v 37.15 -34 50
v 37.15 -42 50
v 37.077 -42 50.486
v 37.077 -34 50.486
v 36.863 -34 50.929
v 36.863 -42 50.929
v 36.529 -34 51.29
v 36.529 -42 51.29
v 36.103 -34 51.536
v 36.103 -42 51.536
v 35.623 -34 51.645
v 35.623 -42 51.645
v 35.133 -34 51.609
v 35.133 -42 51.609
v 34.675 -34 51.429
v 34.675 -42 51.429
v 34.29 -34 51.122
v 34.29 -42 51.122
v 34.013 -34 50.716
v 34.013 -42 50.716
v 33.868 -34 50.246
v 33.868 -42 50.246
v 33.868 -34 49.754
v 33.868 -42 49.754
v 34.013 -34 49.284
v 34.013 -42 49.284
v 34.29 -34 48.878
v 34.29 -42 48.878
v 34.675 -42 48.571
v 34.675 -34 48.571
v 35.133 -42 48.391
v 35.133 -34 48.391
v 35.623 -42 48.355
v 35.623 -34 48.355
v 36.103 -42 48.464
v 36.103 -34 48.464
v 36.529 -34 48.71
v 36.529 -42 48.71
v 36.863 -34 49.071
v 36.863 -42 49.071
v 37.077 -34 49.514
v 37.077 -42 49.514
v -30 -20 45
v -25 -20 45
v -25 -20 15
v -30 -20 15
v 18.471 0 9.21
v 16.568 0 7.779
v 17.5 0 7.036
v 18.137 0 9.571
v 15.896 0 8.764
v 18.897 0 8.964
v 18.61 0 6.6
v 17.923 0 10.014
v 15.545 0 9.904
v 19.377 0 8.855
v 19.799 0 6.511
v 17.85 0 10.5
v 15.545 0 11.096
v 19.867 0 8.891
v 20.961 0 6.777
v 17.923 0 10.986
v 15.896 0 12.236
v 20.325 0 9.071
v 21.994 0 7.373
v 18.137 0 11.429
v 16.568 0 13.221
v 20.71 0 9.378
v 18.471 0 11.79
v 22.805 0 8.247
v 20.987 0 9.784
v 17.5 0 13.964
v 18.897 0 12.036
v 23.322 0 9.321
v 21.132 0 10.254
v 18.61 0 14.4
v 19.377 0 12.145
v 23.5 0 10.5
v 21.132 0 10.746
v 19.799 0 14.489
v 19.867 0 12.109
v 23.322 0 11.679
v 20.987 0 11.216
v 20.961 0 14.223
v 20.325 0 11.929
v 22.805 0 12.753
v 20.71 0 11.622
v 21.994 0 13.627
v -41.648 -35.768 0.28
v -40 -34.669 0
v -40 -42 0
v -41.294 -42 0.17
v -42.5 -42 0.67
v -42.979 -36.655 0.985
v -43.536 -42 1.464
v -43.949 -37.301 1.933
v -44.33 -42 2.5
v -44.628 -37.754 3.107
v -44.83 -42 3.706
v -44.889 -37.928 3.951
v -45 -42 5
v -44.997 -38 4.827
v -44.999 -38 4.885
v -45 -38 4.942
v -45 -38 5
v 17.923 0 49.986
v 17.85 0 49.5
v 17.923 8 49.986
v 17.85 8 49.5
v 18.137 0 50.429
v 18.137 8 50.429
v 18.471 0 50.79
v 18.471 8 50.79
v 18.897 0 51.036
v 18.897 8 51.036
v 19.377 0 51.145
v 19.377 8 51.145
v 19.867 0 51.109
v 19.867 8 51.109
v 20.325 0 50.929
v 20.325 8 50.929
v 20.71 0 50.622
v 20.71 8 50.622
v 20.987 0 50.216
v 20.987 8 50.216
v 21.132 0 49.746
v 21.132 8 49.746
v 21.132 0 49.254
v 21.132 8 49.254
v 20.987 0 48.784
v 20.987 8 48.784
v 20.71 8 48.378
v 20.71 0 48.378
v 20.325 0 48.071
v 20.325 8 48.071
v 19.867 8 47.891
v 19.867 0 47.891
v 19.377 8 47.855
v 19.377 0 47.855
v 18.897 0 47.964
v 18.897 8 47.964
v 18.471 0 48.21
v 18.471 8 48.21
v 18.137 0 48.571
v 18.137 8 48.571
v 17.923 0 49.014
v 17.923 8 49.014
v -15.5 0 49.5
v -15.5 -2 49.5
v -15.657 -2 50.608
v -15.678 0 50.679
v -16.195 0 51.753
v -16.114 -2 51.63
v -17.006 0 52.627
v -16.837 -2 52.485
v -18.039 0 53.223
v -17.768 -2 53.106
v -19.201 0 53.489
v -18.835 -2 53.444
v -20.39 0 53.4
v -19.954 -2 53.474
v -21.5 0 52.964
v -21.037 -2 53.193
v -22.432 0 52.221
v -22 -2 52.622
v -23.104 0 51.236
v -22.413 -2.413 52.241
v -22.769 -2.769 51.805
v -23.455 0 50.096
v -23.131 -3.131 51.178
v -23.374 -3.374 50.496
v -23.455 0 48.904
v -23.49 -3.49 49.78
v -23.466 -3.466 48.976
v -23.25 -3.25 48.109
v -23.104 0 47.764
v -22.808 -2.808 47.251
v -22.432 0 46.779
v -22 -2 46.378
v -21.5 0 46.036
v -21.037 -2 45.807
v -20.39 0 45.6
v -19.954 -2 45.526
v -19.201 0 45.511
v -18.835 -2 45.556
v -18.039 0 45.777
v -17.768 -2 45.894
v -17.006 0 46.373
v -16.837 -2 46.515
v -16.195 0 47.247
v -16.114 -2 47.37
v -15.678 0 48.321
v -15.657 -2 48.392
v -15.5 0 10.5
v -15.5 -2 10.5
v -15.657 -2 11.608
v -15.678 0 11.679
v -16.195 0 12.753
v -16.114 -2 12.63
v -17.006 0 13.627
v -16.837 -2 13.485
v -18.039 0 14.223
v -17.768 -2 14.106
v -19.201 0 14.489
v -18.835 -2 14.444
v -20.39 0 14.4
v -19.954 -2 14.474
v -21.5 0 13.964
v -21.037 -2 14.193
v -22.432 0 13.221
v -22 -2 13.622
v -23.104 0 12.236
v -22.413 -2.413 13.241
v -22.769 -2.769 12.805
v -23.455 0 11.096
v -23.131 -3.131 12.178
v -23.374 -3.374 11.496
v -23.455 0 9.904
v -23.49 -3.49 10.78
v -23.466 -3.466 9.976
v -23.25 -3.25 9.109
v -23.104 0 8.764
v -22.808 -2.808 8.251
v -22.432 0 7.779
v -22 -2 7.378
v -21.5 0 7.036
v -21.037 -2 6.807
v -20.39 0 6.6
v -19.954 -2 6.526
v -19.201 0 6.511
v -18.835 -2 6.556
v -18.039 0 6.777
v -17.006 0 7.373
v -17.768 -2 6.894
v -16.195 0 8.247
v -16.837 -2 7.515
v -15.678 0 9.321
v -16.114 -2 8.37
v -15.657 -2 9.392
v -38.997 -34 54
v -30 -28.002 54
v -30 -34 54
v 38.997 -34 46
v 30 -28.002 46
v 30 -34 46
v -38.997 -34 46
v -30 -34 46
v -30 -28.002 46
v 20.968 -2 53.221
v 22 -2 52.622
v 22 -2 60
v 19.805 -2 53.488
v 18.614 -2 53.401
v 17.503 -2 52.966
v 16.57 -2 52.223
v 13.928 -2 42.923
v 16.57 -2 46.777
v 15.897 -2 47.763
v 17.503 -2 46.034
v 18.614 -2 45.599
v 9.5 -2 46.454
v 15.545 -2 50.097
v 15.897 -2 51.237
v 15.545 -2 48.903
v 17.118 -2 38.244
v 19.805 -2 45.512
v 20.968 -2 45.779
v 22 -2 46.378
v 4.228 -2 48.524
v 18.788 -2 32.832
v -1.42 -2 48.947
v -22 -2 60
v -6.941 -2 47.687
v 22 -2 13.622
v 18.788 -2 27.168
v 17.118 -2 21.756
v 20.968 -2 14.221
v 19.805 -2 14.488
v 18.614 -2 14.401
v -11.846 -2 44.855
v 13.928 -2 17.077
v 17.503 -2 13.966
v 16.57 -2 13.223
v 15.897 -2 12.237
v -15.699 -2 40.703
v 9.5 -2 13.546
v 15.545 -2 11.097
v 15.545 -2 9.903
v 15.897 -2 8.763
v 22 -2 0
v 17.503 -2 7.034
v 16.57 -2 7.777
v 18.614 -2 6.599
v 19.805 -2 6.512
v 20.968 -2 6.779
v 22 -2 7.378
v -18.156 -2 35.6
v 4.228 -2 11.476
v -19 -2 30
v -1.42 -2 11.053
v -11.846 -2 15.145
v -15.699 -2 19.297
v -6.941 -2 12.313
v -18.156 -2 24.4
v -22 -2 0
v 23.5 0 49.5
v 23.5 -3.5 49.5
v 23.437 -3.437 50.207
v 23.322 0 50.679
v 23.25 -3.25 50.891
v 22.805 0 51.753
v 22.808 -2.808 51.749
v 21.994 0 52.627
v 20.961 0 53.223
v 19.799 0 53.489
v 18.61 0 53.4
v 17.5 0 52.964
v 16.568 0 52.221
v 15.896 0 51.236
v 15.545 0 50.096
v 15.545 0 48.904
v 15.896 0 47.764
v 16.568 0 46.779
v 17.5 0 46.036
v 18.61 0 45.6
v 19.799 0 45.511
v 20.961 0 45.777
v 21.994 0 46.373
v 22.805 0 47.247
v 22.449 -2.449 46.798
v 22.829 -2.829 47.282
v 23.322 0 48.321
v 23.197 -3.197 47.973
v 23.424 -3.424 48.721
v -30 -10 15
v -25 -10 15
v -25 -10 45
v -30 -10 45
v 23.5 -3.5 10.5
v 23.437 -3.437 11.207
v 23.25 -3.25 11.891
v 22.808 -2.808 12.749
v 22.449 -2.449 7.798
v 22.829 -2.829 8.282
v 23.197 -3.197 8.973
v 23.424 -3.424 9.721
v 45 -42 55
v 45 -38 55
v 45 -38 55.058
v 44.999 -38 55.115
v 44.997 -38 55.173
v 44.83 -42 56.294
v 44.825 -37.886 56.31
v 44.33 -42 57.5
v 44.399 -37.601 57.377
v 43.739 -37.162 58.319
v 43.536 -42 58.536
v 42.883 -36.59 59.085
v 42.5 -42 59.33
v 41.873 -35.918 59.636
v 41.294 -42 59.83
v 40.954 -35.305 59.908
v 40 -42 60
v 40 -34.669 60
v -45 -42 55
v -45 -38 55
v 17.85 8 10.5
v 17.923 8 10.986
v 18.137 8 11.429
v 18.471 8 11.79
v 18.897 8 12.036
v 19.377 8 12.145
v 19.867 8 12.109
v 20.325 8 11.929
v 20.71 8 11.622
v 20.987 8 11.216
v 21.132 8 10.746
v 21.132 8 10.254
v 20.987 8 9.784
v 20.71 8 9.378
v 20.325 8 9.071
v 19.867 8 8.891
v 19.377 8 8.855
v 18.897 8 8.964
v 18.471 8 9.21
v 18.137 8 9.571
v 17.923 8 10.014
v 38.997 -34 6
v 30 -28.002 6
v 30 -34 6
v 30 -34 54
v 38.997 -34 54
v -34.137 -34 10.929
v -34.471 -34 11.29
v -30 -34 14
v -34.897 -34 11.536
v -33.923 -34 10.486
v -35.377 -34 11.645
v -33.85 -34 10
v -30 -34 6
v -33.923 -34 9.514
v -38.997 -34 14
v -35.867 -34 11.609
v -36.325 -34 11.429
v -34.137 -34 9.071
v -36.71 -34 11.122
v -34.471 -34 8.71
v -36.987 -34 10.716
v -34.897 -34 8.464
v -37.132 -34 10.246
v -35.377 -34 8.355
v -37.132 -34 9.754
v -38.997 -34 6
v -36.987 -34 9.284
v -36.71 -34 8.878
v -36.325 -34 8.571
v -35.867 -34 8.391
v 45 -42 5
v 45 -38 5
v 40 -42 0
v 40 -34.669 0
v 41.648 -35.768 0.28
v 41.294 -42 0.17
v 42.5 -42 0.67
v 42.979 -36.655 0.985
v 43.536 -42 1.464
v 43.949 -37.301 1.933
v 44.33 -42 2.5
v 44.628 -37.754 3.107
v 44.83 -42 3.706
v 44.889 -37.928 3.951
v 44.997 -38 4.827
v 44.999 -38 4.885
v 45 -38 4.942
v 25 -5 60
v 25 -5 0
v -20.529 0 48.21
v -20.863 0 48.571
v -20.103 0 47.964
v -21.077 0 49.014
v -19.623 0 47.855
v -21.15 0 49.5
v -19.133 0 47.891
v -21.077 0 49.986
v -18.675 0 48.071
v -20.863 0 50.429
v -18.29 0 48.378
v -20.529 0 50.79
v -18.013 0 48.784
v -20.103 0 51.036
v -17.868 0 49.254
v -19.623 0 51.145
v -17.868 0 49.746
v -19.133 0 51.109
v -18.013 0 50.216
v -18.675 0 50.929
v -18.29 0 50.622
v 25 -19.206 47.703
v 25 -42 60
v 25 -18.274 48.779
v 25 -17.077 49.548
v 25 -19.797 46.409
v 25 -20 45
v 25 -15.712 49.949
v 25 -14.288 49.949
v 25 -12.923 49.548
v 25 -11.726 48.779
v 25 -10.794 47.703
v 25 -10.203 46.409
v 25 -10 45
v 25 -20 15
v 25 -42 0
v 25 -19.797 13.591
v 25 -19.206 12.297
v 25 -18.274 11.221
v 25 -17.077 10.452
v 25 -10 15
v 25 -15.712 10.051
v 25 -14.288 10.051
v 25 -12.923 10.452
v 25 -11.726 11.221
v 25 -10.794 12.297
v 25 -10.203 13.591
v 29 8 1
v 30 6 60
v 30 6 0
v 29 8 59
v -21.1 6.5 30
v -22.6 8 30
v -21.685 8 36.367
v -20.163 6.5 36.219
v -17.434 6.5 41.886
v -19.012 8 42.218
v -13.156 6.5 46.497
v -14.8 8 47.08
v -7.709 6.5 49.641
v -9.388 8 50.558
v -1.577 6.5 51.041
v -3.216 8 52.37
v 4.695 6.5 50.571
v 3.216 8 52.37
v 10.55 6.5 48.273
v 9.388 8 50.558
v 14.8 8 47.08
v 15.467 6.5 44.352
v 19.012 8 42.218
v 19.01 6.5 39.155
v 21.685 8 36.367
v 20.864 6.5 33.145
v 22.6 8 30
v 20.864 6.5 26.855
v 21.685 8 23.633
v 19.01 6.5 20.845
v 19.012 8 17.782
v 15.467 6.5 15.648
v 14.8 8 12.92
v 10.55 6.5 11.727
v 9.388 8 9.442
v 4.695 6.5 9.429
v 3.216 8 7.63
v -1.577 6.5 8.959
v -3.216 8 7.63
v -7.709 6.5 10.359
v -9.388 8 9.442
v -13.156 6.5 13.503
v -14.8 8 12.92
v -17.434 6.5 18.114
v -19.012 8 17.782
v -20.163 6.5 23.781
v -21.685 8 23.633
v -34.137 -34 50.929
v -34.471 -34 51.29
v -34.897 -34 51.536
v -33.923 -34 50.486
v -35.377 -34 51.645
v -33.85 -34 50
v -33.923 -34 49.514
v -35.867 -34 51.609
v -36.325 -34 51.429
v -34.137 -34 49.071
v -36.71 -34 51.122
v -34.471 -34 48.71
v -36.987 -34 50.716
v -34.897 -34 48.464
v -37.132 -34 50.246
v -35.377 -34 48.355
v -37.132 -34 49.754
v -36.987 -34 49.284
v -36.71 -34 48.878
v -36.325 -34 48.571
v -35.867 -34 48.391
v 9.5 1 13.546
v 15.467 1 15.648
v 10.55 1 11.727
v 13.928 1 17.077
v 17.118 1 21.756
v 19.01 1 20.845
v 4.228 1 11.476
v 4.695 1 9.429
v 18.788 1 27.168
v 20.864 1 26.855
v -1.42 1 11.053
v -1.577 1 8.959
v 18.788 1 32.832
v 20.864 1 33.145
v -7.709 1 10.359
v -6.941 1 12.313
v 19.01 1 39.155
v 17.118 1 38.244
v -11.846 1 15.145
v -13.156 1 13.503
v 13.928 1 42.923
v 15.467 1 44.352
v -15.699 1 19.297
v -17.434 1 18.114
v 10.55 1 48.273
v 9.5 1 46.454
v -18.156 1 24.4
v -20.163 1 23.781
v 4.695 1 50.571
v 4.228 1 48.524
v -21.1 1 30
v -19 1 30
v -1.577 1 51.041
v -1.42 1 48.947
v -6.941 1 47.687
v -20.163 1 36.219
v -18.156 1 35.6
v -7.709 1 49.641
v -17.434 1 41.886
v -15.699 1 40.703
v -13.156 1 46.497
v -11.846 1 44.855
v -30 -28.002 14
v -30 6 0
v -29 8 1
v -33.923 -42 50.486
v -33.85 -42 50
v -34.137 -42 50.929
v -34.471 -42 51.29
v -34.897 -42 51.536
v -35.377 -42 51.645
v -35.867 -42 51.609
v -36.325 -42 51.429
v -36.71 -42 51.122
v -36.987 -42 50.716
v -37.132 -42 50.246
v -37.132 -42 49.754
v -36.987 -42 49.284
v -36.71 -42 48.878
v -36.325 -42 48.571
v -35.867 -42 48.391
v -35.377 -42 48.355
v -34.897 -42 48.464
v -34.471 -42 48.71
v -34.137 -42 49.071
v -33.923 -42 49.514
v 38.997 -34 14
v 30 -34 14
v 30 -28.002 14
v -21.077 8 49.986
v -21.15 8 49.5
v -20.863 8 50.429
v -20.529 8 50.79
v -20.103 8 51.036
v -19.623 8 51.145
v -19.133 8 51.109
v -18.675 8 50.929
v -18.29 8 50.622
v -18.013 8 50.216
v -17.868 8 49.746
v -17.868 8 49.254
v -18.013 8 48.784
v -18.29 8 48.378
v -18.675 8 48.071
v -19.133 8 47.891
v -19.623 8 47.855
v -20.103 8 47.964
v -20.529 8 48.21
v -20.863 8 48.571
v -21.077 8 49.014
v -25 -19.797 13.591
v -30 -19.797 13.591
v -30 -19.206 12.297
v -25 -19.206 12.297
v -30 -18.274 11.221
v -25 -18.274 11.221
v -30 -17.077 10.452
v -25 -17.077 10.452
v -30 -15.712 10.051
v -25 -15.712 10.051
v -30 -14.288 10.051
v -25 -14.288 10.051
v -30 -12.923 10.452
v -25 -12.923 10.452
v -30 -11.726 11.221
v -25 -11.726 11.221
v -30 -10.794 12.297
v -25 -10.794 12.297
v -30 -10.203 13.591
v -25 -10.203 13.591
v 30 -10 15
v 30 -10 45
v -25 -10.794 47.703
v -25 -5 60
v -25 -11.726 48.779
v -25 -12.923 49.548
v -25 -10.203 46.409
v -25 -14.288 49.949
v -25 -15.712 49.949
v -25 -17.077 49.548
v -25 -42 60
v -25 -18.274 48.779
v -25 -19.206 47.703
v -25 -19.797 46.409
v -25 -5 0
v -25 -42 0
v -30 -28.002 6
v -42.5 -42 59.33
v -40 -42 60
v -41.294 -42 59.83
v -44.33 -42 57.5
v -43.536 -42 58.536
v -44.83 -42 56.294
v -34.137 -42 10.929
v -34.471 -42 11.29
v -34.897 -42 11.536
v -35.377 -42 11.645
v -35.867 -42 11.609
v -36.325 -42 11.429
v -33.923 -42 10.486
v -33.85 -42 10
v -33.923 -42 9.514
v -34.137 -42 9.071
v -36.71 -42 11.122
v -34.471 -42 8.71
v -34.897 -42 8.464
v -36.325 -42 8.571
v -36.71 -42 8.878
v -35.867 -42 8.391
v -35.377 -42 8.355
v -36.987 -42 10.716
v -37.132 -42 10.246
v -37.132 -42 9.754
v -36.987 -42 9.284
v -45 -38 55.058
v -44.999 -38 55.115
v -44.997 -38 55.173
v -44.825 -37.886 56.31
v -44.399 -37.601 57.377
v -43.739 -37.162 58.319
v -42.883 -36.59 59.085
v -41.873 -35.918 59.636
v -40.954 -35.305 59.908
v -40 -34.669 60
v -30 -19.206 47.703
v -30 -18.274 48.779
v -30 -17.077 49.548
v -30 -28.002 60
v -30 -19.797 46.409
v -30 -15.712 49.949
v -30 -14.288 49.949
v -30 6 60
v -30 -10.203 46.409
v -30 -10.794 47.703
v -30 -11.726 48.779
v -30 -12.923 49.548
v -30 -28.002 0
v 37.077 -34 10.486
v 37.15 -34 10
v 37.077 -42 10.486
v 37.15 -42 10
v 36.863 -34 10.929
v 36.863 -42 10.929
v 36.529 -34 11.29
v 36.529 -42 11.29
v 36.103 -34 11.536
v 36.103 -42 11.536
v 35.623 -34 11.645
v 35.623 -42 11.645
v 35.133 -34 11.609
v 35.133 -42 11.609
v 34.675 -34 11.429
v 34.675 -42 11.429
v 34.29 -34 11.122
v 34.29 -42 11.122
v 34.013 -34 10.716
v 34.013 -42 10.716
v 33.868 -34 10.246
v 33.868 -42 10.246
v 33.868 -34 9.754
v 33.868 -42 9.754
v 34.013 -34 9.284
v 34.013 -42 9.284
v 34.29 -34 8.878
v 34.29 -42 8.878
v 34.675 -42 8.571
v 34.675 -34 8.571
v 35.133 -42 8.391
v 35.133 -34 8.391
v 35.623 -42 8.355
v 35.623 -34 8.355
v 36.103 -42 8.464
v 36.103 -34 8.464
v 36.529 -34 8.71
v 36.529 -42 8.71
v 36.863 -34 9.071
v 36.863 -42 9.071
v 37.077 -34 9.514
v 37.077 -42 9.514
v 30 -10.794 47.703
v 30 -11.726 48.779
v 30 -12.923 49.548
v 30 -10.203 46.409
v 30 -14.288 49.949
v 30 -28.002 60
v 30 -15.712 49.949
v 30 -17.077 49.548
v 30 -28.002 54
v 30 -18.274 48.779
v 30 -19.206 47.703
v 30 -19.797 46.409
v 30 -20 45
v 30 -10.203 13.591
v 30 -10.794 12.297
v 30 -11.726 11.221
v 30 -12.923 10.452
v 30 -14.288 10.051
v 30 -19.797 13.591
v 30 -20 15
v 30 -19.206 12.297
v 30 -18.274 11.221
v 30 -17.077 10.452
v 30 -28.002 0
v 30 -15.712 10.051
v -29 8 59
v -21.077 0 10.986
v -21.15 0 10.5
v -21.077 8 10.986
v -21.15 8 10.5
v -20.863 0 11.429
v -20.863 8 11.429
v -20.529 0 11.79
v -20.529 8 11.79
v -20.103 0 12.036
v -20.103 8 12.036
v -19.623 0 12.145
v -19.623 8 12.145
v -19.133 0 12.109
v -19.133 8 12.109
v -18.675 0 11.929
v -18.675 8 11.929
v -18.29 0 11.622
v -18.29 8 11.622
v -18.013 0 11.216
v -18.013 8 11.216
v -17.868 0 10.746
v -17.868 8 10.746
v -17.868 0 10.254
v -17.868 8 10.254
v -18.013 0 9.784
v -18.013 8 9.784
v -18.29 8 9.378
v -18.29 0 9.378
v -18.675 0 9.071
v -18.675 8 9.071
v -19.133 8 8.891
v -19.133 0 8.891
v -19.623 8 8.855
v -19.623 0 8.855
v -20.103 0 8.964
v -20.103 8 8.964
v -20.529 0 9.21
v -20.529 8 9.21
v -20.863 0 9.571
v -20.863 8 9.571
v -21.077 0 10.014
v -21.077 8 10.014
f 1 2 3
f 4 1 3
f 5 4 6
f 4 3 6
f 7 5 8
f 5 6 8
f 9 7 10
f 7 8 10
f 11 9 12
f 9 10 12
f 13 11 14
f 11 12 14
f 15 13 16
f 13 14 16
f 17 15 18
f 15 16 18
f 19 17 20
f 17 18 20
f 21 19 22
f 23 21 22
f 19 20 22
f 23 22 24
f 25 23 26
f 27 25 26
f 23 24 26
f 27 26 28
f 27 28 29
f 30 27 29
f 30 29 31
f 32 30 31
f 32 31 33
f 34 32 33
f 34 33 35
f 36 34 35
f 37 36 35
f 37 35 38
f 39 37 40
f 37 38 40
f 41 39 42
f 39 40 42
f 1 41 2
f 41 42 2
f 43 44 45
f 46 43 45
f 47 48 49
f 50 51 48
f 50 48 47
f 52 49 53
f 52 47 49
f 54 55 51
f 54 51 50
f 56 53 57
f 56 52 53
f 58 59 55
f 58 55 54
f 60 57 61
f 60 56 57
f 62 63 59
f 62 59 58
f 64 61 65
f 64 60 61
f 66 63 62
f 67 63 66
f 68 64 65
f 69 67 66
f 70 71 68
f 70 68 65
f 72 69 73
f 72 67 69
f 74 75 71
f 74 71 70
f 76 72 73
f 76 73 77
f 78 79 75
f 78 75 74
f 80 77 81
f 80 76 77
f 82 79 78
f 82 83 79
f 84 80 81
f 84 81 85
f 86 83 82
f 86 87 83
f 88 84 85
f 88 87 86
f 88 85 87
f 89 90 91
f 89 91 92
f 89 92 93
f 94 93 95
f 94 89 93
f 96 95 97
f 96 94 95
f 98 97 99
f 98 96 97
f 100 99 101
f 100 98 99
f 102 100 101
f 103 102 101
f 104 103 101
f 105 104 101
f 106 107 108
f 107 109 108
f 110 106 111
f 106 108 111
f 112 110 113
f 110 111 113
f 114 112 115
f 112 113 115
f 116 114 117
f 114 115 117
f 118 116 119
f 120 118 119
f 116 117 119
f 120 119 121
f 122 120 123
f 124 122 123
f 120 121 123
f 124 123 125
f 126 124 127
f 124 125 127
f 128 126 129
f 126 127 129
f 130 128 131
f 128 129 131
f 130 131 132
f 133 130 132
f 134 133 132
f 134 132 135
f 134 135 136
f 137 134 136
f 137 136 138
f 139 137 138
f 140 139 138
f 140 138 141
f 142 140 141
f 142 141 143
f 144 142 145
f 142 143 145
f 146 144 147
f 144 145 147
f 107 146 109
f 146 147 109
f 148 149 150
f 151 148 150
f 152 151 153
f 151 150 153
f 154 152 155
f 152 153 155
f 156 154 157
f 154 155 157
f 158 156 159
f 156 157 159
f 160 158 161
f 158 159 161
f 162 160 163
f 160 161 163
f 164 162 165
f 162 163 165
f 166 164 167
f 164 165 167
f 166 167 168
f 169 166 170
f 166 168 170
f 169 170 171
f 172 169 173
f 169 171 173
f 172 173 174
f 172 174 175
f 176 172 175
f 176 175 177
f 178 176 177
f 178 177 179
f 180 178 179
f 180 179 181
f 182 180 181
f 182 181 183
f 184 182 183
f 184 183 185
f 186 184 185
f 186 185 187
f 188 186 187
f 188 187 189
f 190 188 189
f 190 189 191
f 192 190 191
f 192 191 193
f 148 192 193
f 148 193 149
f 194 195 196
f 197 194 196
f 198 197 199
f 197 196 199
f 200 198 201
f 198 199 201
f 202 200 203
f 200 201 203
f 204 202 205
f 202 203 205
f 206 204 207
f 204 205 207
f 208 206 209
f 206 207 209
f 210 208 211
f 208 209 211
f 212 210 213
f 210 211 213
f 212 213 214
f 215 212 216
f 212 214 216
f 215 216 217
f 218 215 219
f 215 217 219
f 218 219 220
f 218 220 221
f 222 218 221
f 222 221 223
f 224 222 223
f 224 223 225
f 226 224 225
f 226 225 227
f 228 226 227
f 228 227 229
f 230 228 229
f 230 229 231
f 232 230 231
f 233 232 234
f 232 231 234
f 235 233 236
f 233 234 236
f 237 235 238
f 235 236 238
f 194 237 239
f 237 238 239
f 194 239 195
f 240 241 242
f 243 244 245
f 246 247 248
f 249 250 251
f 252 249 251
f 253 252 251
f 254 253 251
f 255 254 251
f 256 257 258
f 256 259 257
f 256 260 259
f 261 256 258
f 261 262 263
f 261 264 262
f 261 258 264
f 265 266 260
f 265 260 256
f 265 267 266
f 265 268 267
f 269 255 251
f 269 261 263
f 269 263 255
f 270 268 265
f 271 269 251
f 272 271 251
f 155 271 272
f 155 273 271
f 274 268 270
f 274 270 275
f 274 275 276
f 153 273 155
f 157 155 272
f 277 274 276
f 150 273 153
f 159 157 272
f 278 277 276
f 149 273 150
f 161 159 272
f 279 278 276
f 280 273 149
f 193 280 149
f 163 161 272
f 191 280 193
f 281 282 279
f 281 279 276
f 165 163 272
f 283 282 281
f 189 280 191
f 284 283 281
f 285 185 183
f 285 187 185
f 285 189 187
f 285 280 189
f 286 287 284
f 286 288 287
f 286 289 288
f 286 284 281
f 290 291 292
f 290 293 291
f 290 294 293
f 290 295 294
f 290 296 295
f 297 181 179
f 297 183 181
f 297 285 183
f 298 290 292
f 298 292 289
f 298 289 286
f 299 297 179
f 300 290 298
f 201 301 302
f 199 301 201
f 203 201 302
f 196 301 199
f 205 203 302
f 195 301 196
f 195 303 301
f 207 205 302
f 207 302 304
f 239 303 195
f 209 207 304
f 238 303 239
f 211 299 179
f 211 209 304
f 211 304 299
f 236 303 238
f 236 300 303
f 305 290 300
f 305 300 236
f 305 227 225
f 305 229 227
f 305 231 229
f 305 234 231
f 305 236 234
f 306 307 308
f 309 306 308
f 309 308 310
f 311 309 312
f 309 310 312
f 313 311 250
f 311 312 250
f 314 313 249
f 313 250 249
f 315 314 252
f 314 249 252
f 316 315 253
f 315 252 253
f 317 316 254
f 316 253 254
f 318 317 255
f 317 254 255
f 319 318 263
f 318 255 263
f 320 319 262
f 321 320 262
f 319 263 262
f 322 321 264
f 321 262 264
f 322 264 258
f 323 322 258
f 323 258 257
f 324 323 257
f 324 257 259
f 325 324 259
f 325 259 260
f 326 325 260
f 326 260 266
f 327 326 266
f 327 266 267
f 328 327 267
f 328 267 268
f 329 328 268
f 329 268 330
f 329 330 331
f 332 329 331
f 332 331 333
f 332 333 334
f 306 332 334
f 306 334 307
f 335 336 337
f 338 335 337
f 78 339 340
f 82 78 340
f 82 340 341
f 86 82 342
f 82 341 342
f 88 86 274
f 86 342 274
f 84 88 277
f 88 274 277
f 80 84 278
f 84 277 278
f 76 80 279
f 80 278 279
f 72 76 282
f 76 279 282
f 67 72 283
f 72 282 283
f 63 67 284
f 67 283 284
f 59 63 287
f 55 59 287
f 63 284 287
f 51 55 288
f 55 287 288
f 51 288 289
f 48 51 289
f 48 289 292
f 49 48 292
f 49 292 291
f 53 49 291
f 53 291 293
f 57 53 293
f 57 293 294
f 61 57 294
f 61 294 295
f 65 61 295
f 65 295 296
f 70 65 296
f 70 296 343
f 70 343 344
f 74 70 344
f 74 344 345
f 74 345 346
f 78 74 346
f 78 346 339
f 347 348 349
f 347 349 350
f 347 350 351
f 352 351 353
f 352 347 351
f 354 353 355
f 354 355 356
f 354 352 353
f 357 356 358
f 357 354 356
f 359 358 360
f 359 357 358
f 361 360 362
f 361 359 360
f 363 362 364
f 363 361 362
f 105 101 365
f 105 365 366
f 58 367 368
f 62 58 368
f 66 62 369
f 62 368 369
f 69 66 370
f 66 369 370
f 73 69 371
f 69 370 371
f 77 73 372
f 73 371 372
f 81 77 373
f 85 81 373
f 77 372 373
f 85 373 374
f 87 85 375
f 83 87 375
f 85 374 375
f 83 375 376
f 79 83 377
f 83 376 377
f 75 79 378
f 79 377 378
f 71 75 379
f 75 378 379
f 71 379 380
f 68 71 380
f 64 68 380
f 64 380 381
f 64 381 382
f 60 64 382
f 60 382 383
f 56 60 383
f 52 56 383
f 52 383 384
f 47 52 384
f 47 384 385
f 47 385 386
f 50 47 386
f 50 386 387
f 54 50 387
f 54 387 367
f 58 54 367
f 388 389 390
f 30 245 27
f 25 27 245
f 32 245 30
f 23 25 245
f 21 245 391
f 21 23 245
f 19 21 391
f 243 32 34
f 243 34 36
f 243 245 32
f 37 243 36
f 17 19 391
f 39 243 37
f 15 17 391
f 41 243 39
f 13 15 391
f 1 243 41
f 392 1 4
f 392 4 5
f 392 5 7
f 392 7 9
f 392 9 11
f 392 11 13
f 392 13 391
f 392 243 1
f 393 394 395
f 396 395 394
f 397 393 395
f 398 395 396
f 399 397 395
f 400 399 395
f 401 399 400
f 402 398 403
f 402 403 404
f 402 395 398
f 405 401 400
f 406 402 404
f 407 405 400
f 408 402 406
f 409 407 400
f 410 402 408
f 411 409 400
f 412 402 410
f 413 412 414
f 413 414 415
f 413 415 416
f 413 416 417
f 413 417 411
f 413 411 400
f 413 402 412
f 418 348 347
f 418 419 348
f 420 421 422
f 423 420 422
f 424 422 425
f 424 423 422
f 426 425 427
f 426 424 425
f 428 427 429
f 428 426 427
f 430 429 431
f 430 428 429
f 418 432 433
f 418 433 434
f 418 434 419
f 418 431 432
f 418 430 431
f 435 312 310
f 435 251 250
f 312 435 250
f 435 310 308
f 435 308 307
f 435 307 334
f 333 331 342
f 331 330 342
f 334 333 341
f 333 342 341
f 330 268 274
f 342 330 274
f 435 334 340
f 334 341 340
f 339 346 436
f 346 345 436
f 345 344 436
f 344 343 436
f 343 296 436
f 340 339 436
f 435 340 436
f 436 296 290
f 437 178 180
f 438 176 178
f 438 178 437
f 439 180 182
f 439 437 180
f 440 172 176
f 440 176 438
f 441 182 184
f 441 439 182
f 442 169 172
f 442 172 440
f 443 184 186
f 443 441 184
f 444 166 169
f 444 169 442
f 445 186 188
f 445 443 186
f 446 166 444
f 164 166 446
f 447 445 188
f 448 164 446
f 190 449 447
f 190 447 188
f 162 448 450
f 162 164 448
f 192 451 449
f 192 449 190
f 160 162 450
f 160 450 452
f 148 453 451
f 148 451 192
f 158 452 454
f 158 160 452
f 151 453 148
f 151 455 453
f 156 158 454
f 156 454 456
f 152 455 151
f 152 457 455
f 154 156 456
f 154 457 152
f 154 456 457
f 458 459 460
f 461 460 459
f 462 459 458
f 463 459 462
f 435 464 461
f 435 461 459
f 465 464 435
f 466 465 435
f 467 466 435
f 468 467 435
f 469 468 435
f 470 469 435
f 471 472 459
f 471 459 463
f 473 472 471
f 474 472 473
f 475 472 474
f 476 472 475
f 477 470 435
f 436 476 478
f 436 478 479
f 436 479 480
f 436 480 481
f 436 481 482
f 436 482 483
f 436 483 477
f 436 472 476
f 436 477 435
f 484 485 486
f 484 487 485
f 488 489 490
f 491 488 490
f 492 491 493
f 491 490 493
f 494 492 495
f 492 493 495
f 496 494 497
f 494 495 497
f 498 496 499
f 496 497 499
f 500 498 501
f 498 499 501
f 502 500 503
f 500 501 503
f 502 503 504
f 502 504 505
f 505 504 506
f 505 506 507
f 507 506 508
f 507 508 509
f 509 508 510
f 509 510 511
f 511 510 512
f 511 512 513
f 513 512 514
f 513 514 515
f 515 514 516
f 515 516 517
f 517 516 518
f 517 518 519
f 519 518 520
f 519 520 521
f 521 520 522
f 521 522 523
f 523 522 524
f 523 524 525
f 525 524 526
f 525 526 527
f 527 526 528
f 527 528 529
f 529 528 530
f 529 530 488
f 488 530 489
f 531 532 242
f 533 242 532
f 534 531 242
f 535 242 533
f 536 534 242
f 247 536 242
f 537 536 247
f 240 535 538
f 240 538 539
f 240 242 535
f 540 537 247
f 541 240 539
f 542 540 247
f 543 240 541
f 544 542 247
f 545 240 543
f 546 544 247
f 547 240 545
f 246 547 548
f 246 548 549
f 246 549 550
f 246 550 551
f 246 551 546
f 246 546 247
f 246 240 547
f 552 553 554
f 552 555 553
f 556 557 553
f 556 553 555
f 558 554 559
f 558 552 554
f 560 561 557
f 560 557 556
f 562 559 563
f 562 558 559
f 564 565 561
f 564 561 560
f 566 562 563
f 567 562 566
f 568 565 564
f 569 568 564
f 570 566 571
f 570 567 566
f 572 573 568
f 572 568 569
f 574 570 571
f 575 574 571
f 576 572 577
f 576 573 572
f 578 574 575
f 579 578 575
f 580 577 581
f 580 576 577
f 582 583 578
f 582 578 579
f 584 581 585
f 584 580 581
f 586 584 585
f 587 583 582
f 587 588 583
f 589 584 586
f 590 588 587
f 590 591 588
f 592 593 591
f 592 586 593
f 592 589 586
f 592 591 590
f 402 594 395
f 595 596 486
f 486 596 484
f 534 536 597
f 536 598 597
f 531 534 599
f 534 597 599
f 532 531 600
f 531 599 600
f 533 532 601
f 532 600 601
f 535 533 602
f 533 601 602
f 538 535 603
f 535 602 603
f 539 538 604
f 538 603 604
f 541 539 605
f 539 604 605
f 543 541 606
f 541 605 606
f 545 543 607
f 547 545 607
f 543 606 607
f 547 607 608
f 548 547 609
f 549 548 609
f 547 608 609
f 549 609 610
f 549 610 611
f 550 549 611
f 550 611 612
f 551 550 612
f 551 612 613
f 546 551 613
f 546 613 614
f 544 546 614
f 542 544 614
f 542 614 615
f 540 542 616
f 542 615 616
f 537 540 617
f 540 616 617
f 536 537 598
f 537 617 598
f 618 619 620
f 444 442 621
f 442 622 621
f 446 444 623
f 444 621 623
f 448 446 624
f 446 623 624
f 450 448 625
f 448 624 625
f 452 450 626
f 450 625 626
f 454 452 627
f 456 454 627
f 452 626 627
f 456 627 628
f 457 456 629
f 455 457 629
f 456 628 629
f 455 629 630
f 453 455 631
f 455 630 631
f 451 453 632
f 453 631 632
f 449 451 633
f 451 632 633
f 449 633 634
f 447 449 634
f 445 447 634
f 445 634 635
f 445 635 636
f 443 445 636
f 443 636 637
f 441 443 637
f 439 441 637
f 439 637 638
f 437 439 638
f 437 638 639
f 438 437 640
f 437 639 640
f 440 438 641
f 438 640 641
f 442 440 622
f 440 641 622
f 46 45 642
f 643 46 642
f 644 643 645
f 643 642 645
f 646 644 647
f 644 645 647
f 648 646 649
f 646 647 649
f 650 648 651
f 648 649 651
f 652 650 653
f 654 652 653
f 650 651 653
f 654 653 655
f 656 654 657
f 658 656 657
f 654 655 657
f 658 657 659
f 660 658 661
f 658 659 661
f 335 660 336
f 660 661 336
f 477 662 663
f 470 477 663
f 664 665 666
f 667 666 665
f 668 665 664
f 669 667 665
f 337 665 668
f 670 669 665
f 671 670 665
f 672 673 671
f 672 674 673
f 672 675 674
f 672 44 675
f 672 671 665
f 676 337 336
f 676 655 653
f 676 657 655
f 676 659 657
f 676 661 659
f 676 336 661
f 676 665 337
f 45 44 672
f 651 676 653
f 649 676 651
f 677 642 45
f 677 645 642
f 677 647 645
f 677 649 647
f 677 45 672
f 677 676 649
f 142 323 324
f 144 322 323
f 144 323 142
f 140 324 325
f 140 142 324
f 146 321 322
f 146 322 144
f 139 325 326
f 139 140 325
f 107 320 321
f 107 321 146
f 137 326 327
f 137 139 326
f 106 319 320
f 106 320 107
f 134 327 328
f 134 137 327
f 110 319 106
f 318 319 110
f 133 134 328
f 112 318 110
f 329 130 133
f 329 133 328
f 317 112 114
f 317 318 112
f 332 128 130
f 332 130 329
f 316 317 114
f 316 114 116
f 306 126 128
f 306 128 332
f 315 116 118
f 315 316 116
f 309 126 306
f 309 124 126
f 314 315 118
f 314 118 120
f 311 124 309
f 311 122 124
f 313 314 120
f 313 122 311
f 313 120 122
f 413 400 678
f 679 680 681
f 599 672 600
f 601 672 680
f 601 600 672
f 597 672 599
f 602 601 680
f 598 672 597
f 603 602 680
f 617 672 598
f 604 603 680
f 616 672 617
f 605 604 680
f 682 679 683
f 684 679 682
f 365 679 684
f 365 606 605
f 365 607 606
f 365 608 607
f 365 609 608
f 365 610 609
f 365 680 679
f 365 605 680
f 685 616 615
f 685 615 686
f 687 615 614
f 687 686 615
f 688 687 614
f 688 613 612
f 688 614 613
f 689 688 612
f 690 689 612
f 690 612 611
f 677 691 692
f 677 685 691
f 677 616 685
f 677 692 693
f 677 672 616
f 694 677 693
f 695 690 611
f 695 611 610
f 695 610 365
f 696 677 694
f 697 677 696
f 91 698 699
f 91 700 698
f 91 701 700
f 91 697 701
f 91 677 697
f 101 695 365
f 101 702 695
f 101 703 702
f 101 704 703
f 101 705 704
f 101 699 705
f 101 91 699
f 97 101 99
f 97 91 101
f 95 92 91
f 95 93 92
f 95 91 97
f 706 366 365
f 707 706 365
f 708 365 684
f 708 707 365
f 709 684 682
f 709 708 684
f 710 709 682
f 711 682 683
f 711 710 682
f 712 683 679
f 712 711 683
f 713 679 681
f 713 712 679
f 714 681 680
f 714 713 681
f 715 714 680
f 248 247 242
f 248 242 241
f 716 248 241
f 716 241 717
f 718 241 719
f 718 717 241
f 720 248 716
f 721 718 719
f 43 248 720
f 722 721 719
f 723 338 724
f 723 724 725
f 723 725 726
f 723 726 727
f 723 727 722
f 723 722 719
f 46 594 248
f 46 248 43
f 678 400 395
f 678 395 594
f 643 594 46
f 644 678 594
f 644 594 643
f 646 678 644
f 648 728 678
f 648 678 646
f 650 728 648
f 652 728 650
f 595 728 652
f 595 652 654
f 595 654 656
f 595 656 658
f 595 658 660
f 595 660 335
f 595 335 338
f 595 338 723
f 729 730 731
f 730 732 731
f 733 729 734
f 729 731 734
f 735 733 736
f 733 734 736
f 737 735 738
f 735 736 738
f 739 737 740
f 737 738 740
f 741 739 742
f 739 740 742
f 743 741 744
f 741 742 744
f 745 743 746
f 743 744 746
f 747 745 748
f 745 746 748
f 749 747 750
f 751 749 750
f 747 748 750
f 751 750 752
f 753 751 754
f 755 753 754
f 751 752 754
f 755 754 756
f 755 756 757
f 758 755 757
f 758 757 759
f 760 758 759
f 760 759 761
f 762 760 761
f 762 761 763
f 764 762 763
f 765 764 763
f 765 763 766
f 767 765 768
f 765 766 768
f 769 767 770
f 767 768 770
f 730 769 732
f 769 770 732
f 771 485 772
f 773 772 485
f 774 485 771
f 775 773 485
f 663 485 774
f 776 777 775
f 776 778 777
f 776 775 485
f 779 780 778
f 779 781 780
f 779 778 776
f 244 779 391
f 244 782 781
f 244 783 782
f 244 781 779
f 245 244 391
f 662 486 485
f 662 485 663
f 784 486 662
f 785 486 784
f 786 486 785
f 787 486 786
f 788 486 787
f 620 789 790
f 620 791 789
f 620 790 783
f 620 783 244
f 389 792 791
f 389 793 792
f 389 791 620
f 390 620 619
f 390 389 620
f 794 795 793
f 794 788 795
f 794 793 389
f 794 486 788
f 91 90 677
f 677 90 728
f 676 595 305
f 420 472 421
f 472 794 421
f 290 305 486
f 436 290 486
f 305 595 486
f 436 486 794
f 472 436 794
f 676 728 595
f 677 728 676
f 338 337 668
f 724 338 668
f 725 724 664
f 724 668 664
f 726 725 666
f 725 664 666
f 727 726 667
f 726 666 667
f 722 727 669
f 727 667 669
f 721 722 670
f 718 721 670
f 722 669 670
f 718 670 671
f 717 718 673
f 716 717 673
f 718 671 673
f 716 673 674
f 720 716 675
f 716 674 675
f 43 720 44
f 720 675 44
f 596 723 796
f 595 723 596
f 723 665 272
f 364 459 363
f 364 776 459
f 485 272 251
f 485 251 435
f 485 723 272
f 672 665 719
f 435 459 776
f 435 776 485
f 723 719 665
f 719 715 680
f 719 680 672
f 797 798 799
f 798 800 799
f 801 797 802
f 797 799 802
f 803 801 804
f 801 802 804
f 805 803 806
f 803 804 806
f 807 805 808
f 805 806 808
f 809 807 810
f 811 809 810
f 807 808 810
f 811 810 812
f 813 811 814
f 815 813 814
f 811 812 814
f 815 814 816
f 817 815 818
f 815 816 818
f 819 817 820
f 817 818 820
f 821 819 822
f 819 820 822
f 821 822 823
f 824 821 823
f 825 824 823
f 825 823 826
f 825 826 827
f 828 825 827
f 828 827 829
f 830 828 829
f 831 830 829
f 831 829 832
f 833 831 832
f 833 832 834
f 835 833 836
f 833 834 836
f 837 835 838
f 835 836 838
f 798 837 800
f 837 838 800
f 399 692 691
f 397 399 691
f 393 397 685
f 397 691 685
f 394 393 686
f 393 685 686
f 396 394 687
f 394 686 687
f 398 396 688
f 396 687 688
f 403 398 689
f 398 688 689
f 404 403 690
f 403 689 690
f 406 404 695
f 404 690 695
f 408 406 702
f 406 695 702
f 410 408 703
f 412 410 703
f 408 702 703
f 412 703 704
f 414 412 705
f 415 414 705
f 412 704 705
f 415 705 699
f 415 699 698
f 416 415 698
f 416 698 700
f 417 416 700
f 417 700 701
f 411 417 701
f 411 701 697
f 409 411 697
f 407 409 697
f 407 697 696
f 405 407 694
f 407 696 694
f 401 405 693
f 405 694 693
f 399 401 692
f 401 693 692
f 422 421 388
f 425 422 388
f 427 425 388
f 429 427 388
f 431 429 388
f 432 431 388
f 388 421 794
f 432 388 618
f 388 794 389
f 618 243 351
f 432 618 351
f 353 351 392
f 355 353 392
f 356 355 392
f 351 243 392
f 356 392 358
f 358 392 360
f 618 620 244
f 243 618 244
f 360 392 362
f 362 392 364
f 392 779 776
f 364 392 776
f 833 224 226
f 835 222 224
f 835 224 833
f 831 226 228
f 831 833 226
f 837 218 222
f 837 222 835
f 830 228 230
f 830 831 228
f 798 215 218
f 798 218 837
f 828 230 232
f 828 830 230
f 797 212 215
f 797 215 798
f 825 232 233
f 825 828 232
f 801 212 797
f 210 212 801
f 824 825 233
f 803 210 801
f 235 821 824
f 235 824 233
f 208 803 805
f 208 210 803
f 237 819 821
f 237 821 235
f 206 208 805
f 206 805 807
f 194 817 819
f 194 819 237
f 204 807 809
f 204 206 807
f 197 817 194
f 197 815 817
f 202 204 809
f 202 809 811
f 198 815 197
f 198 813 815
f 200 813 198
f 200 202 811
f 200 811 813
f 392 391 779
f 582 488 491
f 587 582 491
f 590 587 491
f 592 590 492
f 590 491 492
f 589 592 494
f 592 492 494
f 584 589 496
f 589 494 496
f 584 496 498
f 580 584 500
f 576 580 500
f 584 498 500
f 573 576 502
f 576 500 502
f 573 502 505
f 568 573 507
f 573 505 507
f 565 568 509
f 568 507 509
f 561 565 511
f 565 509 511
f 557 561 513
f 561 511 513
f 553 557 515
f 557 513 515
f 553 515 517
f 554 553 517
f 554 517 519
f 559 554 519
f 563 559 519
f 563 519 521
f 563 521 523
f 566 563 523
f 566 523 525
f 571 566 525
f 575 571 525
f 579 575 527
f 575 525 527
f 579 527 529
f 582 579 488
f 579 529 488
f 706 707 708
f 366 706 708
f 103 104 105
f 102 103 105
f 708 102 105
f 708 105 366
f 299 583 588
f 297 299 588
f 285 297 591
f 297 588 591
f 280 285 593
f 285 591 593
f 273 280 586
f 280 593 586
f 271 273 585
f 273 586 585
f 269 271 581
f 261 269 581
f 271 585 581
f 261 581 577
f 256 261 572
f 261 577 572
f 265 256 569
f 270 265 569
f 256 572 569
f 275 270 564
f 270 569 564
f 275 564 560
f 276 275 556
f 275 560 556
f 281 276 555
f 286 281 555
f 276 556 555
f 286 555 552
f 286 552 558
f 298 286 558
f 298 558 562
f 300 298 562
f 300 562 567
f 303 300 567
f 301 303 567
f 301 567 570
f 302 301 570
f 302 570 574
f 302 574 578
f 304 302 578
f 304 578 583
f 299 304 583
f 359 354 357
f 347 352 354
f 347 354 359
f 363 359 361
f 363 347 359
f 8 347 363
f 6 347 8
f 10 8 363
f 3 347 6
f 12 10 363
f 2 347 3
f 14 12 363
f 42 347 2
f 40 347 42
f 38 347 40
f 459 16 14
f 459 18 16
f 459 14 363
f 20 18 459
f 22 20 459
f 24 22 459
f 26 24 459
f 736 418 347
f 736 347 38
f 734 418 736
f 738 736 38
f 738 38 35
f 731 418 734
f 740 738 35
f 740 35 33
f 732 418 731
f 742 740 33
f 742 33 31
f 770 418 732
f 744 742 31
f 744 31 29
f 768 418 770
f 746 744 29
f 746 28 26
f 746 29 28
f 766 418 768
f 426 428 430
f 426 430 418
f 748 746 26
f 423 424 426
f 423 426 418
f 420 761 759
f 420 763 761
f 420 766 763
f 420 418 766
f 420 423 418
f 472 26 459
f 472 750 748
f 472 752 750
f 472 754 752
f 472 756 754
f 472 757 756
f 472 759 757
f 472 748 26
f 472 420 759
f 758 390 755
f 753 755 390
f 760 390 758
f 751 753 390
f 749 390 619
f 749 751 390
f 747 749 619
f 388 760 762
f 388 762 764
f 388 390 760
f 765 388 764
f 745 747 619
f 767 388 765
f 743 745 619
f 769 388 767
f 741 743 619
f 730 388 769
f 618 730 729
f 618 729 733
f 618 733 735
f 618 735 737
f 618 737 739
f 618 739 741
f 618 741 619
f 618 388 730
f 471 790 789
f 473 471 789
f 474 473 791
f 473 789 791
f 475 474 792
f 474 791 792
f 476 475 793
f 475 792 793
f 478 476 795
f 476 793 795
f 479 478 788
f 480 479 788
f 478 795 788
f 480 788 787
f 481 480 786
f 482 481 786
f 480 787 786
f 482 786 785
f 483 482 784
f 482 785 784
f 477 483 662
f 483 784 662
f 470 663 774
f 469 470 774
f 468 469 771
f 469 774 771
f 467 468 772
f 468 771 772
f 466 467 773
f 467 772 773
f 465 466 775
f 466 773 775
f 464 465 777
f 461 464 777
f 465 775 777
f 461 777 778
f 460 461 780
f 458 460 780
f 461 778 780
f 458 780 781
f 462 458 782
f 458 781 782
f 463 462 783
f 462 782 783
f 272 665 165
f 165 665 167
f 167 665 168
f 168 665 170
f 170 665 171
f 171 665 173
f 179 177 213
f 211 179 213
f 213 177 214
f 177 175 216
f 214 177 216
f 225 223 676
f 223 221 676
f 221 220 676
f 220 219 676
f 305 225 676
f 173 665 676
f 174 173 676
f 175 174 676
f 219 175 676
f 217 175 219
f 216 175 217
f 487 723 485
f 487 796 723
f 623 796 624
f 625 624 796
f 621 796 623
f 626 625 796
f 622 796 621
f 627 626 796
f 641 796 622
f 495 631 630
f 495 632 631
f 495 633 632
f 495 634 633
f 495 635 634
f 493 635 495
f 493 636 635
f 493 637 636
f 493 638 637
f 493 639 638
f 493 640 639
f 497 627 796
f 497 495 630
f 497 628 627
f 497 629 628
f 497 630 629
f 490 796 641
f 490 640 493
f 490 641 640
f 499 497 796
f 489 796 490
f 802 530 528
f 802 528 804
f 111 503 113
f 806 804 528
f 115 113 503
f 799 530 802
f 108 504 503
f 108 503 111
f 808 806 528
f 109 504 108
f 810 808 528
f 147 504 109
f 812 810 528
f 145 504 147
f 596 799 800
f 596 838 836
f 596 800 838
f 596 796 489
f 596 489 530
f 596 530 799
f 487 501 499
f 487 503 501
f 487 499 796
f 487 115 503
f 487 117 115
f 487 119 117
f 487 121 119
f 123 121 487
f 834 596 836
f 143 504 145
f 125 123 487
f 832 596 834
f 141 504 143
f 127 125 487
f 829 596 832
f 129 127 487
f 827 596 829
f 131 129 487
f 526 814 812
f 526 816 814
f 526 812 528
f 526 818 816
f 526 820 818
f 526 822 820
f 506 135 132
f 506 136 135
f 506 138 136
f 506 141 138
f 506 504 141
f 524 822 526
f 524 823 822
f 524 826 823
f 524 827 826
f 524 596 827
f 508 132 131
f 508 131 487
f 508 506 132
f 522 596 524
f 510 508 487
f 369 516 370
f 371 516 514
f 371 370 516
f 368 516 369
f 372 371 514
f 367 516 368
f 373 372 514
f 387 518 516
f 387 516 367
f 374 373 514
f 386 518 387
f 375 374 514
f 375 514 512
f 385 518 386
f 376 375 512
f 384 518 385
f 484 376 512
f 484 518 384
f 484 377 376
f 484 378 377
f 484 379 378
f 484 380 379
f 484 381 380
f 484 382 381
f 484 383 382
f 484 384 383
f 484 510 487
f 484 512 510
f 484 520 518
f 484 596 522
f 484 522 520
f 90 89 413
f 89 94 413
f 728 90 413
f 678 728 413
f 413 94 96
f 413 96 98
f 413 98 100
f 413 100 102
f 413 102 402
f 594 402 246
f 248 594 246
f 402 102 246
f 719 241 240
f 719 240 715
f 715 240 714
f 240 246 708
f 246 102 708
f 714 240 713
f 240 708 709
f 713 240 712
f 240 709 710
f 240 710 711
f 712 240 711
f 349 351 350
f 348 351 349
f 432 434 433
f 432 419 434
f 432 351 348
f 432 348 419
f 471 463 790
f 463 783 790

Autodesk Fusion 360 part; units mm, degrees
sketch "Sketch1" plane through (0, 0, 0) normal (0, 0, 1) x (1, 0, 0)
  line L0 (-45, -42) -> (-45, -38)
  line L1 (-45, -38) -> (-30, -38)
  line L2 (-30, -38) -> (-30, 8)
  line L3 (-30, 8) -> (30, 8)
  line L4 (30, 8) -> (30, -38)
  line L5 (30, -38) -> (45, -38)
  line L6 (45, -38) -> (45, -42)
  line L7 (45, -42) -> (25, -42)
  line L8 (25, -42) -> (25, -2)
  line L9 (25, -2) -> (-25, -2)
  line L10 (-25, -2) -> (-25, -42)
  line L11 (-25, -42) -> (-45, -42)
  dimension "d1" = 60
  dimension "d2" = 30
  dimension "d3" = 4
  dimension "d4" = 4
  dimension "d5" = 5
  dimension "d6" = 5
  dimension "d7" = 10
  dimension "d8" = 15
  dimension "d9" = 15
  dimension "d24" = 46
  dimension "d25" = 46
extrude "Extrude1" add sketch "Sketch1" along normal blind 60
sketch "Sketch2" plane through (0, 8, 0) normal (0, 1, 0) x (-1, 0, 0)
  line L0 (-30, 0) -> (30, 0)
  line L1 (30, 0) -> (30, 60)
  line L2 (30, 60) -> (-30, 60)
  line L3 (-30, 60) -> (-30, 0)
  circle A0 centre (0, 30) radius 21.1
  dimension "d14" = 42.2
  dimension "d15" = 30
  dimension "d16" = 30
extrude "Extrude2" cut sketch "Sketch2" against normal blind 7 contours A0
sketch "Sketch3" plane through (0, 1, 0) normal (0, 1, 0) x (-1, 0, 0)
  circle A0 centre (0, 30) radius 21.1
  circle A1 centre (0, 30) radius 19
  dimension "d20" = 38
extrude "Extrude3" cut sketch "Sketch3" against normal up to surface (3 mm away) contours A1
chamfer "Chamfer1" distance 10 distance2 15 1 edges at (-30, -38, 30) measured on face at (-30, -22.6667, 40)
chamfer "Chamfer2" distance 15 distance2 10 1 edges at (30, -38, 30) measured on face at (35, -38, 20)
chamfer "Chamfer3" distance 1.5 angle 45 1 edges at (19.6721, 8, 37.6301)
chamfer "Chamfer4" distance 2 distance2 1 2 edges at (0, 8, 0) (0, 8, 60) measured on face at (33.3323, -36.0007, 0) measured on face at (33.3323, -36.0007, 60)
chamfer "Chamfer5" distance 2 distance2 1 1 edges at (30, 8, 30) measured on face at (30, -5.334, 40)
chamfer "Chamfer6" distance 1 distance2 2 1 edges at (-30, 8, 30) measured on face at (-27.5333, 8, 30)
chamfer "Chamfer7" distance 3 angle 45 2 edges at (25, -2, 30) (-25, -2, 30)
sketch "Sketch4" plane through (0, 8, 0) normal (0, 1, 0) x (-1, 0, 0)
  circle A0 centre (0, 30) radius 22.6
  line L0 (29, 1) -> (29, 59)
  line L1 (29, 59) -> (-29, 59)
  line L2 (-29, 59) -> (-29, 1)
  line L3 (-29, 1) -> (29, 1)
  circle A1 centre (-19.5, 10.5) radius 1.65
  circle A2 centre (19.5, 10.5) radius 1.65
  circle A3 centre (19.5, 49.5) radius 1.65
  circle A4 centre (-19.5, 49.5) radius 1.65
  dimension "d40" = 3.3
  dimension "d41" = 19.5
  dimension "d42" = 19.5
  dimension "d44" = 360
extrude "Extrude4" cut sketch "Sketch4" against normal blind 15 contours A1 | A2 | A3 | A4
sketch "Sketch5" plane through (0, -2, 0) normal (0, -1, 0) x (1, 0, 0)
  circle A0 centre (-19.5, 10.5) radius 1.65
  circle A1 centre (-19.5, 49.5) radius 1.65
  circle A2 centre (19.5, 10.5) radius 1.65
  circle A3 centre (19.5, 49.5) radius 1.65
  circle A4 centre (0, 30) radius 19
  line L0 (-22, 60) -> (-22, 0)
  line L1 (-22, 0) -> (22, 0)
  line L2 (22, 0) -> (22, 60)
  line L3 (22, 60) -> (-22, 60)
  circle A5 centre (19.5, 49.5) radius 4
  circle A6 centre (-19.5, 49.5) radius 4
  circle A7 centre (-19.5, 10.5) radius 4
  circle A8 centre (19.5, 10.5) radius 4
  dimension "d47" = 8
  dimension "d49" = 360
extrude "Extrude5" cut sketch "Sketch5" along normal blind -2 and the other way blind -2 contours L0 A6 | L0 A6 | L2 A5 | L2 A5 | L0 A7 | L0 A7 | L2 A8 | L2 A8
sketch "Sketch6" plane through (0, -42, 0) normal (0, -1, 0) x (1, 0, 0)
  line L0 (25, 0) -> (45, 0)
  line L1 (45, 0) -> (45, 60)
  line L2 (45, 60) -> (25, 60)
  line L3 (25, 60) -> (25, 0)
  circle A0 centre (35.5, 50) radius 1.65
  circle A1 centre (35.5, 10) radius 1.65
  circle A2 centre (-35.5, 10) radius 1.65
  circle A3 centre (-35.5, 50) radius 1.65
  arc A4 (-22, 46.3775) -> (-22, 52.6225) centre (-19.5, 49.5) ccw
  arc A5 (22, 52.6225) -> (22, 46.3775) centre (19.5, 49.5) ccw
  arc A6 (22, 13.6225) -> (22, 7.3775) centre (19.5, 10.5) ccw
  arc A7 (-22, 7.3775) -> (-22, 13.6225) centre (-19.5, 10.5) ccw
  dimension "d54" = 3.3
  dimension "d55" = 10
  dimension "d57" = 3.3
  dimension "d59" = 10
  dimension "d60" = 3.3
  dimension "d61" = 10
  dimension "d63" = 3.3
  dimension "d64" = 10
  dimension "d66" = 16
  dimension "d67" = 16
  dimension "d68" = 16
  dimension "d69" = 16
extrude "Extrude6" cut sketch "Sketch6" against normal blind 25 contours A0 | A1 | A2 | A3
sketch "Sketch7" plane through (45, 0, 0) normal (1, 0, 0) x (0, 0, -1)
  line L0 (0, -42) -> (0, -38)
  line L1 (0, -38) -> (-60, -38)
  line L2 (-60, -38) -> (-60, -42)
  line L3 (-60, -42) -> (0, -42)
  line L4 (-54, -28) -> (-46, -28)
  line L5 (-46, -28) -> (-46, -34)
  line L6 (-46, -34) -> (-54, -34)
  line L7 (-54, -34) -> (-54, -28)
  line L8 (-14, -28) -> (-6, -28)
  line L9 (-6, -28) -> (-6, -34)
  line L10 (-6, -34) -> (-14, -34)
  line L11 (-14, -34) -> (-14, -28)
  dimension "d72" = 8
  dimension "d73" = 6
  dimension "d74" = 8
  dimension "d75" = 8
  dimension "d76" = 8
  dimension "d77" = 6
extrude "Extrude7" cut sketch "Sketch7" against normal blind 15 contours L4 L5 L6 L7 | L8 L9 L10 L11
sketch "Sketch8" plane through (-45, 0, 0) normal (-1, 0, 0) x (0, 0, 1)
  line L0 (0, -38) -> (0, -42)
  line L1 (0, -42) -> (60, -42)
  line L2 (60, -42) -> (60, -38)
  line L3 (60, -38) -> (0, -38)
  line L4 (6, -28) -> (14, -28)
  line L5 (14, -28) -> (14, -34)
  line L6 (14, -34) -> (6, -34)
  line L7 (6, -34) -> (6, -28)
  line L8 (46, -28) -> (54, -28)
  line L9 (54, -28) -> (54, -34)
  line L10 (54, -34) -> (46, -34)
  line L11 (46, -34) -> (46, -28)
  dimension "d80" = 8
  dimension "d81" = 8
  dimension "d82" = 6
  dimension "d83" = 8
  dimension "d84" = 8
  dimension "d85" = 6
extrude "Extrude8" cut sketch "Sketch8" against normal blind 15 contours L4 L5 L6 L7 | L8 L9 L10 L11
fillet "Fillet1" radius 5 4 edges at (-45, -40, 0) (45, -40, 0) (45, -40, 60) (-45, -40, 60)
sketch "Sketch9" plane through (30, 0, 0) normal (1, 0, 0) x (0, 0, -1)
  line L0 (0, 6) -> (-60, 6)
  line L1 (-60, 6) -> (-60, -28)
  line L2 (-60, -28) -> (-54, -28)
  line L3 (-54, -28) -> (-54, -34)
  line L4 (-54, -34) -> (-46, -34)
  line L5 (-46, -34) -> (-46, -28)
  line L6 (-46, -28) -> (-14, -28)
  line L7 (-14, -28) -> (-14, -34)
  line L8 (-14, -34) -> (-6, -34)
  line L9 (-6, -34) -> (-6, -28)
  line L10 (-6, -28) -> (0, -28)
  line L11 (0, -28) -> (0, 6)
  line L12 (-45, -20) -> (-15, -20)
  arc A0 (-15, -20) -> (-15, -10) centre (-15, -15) ccw
  line L13 (-15, -10) -> (-45, -10)
  arc A1 (-45, -10) -> (-45, -20) centre (-45, -15) ccw
  line L14 (-45, -15) -> (-15, -15) construction
  dimension "d89" = 30
  dimension "d90" = 15
  dimension "d91" = 15
extrude "Extrude9" cut sketch "Sketch9" against normal up to surface (60 mm away) contours L12 A0 L13 A1
equation "d1 = main"
equation "d2 = d1 / 2"
equation "d3 = leg_thickness"
equation "d4 = leg_thickness"
equation "d6 = d5"
equation "d8 = leg"
equation "d9 = leg"
equation "main = 60 mm"
equation "d11 = main"
equation "bearing_od = 42.2 mm"
equation "d14 = bearing_od"
equation "d15 = main / 2"
equation "d16 = main / 2"
equation "bearing_thickness = 7 mm"
equation "d18 = -bearing_thickness"
equation "height = 46 mm"
equation "d24 = height"
equation "d25 = height"
equation "leg = 15 mm"
equation "d28 = leg"
equation "d29 = leg"
equation "leg_thickness = 4 mm"
equation "d41 = d42"
equation "d57 = d54"
equation "d59 = d55"
equation "d60 = d54"
equation "d61 = d55"
equation "d63 = d54"
equation "d64 = d55"
equation "d66 = d67"
equation "d68 = d67"
equation "d69 = d67"
equation "d75 = d72"
equation "d76 = d74"
equation "d77 = d73"
